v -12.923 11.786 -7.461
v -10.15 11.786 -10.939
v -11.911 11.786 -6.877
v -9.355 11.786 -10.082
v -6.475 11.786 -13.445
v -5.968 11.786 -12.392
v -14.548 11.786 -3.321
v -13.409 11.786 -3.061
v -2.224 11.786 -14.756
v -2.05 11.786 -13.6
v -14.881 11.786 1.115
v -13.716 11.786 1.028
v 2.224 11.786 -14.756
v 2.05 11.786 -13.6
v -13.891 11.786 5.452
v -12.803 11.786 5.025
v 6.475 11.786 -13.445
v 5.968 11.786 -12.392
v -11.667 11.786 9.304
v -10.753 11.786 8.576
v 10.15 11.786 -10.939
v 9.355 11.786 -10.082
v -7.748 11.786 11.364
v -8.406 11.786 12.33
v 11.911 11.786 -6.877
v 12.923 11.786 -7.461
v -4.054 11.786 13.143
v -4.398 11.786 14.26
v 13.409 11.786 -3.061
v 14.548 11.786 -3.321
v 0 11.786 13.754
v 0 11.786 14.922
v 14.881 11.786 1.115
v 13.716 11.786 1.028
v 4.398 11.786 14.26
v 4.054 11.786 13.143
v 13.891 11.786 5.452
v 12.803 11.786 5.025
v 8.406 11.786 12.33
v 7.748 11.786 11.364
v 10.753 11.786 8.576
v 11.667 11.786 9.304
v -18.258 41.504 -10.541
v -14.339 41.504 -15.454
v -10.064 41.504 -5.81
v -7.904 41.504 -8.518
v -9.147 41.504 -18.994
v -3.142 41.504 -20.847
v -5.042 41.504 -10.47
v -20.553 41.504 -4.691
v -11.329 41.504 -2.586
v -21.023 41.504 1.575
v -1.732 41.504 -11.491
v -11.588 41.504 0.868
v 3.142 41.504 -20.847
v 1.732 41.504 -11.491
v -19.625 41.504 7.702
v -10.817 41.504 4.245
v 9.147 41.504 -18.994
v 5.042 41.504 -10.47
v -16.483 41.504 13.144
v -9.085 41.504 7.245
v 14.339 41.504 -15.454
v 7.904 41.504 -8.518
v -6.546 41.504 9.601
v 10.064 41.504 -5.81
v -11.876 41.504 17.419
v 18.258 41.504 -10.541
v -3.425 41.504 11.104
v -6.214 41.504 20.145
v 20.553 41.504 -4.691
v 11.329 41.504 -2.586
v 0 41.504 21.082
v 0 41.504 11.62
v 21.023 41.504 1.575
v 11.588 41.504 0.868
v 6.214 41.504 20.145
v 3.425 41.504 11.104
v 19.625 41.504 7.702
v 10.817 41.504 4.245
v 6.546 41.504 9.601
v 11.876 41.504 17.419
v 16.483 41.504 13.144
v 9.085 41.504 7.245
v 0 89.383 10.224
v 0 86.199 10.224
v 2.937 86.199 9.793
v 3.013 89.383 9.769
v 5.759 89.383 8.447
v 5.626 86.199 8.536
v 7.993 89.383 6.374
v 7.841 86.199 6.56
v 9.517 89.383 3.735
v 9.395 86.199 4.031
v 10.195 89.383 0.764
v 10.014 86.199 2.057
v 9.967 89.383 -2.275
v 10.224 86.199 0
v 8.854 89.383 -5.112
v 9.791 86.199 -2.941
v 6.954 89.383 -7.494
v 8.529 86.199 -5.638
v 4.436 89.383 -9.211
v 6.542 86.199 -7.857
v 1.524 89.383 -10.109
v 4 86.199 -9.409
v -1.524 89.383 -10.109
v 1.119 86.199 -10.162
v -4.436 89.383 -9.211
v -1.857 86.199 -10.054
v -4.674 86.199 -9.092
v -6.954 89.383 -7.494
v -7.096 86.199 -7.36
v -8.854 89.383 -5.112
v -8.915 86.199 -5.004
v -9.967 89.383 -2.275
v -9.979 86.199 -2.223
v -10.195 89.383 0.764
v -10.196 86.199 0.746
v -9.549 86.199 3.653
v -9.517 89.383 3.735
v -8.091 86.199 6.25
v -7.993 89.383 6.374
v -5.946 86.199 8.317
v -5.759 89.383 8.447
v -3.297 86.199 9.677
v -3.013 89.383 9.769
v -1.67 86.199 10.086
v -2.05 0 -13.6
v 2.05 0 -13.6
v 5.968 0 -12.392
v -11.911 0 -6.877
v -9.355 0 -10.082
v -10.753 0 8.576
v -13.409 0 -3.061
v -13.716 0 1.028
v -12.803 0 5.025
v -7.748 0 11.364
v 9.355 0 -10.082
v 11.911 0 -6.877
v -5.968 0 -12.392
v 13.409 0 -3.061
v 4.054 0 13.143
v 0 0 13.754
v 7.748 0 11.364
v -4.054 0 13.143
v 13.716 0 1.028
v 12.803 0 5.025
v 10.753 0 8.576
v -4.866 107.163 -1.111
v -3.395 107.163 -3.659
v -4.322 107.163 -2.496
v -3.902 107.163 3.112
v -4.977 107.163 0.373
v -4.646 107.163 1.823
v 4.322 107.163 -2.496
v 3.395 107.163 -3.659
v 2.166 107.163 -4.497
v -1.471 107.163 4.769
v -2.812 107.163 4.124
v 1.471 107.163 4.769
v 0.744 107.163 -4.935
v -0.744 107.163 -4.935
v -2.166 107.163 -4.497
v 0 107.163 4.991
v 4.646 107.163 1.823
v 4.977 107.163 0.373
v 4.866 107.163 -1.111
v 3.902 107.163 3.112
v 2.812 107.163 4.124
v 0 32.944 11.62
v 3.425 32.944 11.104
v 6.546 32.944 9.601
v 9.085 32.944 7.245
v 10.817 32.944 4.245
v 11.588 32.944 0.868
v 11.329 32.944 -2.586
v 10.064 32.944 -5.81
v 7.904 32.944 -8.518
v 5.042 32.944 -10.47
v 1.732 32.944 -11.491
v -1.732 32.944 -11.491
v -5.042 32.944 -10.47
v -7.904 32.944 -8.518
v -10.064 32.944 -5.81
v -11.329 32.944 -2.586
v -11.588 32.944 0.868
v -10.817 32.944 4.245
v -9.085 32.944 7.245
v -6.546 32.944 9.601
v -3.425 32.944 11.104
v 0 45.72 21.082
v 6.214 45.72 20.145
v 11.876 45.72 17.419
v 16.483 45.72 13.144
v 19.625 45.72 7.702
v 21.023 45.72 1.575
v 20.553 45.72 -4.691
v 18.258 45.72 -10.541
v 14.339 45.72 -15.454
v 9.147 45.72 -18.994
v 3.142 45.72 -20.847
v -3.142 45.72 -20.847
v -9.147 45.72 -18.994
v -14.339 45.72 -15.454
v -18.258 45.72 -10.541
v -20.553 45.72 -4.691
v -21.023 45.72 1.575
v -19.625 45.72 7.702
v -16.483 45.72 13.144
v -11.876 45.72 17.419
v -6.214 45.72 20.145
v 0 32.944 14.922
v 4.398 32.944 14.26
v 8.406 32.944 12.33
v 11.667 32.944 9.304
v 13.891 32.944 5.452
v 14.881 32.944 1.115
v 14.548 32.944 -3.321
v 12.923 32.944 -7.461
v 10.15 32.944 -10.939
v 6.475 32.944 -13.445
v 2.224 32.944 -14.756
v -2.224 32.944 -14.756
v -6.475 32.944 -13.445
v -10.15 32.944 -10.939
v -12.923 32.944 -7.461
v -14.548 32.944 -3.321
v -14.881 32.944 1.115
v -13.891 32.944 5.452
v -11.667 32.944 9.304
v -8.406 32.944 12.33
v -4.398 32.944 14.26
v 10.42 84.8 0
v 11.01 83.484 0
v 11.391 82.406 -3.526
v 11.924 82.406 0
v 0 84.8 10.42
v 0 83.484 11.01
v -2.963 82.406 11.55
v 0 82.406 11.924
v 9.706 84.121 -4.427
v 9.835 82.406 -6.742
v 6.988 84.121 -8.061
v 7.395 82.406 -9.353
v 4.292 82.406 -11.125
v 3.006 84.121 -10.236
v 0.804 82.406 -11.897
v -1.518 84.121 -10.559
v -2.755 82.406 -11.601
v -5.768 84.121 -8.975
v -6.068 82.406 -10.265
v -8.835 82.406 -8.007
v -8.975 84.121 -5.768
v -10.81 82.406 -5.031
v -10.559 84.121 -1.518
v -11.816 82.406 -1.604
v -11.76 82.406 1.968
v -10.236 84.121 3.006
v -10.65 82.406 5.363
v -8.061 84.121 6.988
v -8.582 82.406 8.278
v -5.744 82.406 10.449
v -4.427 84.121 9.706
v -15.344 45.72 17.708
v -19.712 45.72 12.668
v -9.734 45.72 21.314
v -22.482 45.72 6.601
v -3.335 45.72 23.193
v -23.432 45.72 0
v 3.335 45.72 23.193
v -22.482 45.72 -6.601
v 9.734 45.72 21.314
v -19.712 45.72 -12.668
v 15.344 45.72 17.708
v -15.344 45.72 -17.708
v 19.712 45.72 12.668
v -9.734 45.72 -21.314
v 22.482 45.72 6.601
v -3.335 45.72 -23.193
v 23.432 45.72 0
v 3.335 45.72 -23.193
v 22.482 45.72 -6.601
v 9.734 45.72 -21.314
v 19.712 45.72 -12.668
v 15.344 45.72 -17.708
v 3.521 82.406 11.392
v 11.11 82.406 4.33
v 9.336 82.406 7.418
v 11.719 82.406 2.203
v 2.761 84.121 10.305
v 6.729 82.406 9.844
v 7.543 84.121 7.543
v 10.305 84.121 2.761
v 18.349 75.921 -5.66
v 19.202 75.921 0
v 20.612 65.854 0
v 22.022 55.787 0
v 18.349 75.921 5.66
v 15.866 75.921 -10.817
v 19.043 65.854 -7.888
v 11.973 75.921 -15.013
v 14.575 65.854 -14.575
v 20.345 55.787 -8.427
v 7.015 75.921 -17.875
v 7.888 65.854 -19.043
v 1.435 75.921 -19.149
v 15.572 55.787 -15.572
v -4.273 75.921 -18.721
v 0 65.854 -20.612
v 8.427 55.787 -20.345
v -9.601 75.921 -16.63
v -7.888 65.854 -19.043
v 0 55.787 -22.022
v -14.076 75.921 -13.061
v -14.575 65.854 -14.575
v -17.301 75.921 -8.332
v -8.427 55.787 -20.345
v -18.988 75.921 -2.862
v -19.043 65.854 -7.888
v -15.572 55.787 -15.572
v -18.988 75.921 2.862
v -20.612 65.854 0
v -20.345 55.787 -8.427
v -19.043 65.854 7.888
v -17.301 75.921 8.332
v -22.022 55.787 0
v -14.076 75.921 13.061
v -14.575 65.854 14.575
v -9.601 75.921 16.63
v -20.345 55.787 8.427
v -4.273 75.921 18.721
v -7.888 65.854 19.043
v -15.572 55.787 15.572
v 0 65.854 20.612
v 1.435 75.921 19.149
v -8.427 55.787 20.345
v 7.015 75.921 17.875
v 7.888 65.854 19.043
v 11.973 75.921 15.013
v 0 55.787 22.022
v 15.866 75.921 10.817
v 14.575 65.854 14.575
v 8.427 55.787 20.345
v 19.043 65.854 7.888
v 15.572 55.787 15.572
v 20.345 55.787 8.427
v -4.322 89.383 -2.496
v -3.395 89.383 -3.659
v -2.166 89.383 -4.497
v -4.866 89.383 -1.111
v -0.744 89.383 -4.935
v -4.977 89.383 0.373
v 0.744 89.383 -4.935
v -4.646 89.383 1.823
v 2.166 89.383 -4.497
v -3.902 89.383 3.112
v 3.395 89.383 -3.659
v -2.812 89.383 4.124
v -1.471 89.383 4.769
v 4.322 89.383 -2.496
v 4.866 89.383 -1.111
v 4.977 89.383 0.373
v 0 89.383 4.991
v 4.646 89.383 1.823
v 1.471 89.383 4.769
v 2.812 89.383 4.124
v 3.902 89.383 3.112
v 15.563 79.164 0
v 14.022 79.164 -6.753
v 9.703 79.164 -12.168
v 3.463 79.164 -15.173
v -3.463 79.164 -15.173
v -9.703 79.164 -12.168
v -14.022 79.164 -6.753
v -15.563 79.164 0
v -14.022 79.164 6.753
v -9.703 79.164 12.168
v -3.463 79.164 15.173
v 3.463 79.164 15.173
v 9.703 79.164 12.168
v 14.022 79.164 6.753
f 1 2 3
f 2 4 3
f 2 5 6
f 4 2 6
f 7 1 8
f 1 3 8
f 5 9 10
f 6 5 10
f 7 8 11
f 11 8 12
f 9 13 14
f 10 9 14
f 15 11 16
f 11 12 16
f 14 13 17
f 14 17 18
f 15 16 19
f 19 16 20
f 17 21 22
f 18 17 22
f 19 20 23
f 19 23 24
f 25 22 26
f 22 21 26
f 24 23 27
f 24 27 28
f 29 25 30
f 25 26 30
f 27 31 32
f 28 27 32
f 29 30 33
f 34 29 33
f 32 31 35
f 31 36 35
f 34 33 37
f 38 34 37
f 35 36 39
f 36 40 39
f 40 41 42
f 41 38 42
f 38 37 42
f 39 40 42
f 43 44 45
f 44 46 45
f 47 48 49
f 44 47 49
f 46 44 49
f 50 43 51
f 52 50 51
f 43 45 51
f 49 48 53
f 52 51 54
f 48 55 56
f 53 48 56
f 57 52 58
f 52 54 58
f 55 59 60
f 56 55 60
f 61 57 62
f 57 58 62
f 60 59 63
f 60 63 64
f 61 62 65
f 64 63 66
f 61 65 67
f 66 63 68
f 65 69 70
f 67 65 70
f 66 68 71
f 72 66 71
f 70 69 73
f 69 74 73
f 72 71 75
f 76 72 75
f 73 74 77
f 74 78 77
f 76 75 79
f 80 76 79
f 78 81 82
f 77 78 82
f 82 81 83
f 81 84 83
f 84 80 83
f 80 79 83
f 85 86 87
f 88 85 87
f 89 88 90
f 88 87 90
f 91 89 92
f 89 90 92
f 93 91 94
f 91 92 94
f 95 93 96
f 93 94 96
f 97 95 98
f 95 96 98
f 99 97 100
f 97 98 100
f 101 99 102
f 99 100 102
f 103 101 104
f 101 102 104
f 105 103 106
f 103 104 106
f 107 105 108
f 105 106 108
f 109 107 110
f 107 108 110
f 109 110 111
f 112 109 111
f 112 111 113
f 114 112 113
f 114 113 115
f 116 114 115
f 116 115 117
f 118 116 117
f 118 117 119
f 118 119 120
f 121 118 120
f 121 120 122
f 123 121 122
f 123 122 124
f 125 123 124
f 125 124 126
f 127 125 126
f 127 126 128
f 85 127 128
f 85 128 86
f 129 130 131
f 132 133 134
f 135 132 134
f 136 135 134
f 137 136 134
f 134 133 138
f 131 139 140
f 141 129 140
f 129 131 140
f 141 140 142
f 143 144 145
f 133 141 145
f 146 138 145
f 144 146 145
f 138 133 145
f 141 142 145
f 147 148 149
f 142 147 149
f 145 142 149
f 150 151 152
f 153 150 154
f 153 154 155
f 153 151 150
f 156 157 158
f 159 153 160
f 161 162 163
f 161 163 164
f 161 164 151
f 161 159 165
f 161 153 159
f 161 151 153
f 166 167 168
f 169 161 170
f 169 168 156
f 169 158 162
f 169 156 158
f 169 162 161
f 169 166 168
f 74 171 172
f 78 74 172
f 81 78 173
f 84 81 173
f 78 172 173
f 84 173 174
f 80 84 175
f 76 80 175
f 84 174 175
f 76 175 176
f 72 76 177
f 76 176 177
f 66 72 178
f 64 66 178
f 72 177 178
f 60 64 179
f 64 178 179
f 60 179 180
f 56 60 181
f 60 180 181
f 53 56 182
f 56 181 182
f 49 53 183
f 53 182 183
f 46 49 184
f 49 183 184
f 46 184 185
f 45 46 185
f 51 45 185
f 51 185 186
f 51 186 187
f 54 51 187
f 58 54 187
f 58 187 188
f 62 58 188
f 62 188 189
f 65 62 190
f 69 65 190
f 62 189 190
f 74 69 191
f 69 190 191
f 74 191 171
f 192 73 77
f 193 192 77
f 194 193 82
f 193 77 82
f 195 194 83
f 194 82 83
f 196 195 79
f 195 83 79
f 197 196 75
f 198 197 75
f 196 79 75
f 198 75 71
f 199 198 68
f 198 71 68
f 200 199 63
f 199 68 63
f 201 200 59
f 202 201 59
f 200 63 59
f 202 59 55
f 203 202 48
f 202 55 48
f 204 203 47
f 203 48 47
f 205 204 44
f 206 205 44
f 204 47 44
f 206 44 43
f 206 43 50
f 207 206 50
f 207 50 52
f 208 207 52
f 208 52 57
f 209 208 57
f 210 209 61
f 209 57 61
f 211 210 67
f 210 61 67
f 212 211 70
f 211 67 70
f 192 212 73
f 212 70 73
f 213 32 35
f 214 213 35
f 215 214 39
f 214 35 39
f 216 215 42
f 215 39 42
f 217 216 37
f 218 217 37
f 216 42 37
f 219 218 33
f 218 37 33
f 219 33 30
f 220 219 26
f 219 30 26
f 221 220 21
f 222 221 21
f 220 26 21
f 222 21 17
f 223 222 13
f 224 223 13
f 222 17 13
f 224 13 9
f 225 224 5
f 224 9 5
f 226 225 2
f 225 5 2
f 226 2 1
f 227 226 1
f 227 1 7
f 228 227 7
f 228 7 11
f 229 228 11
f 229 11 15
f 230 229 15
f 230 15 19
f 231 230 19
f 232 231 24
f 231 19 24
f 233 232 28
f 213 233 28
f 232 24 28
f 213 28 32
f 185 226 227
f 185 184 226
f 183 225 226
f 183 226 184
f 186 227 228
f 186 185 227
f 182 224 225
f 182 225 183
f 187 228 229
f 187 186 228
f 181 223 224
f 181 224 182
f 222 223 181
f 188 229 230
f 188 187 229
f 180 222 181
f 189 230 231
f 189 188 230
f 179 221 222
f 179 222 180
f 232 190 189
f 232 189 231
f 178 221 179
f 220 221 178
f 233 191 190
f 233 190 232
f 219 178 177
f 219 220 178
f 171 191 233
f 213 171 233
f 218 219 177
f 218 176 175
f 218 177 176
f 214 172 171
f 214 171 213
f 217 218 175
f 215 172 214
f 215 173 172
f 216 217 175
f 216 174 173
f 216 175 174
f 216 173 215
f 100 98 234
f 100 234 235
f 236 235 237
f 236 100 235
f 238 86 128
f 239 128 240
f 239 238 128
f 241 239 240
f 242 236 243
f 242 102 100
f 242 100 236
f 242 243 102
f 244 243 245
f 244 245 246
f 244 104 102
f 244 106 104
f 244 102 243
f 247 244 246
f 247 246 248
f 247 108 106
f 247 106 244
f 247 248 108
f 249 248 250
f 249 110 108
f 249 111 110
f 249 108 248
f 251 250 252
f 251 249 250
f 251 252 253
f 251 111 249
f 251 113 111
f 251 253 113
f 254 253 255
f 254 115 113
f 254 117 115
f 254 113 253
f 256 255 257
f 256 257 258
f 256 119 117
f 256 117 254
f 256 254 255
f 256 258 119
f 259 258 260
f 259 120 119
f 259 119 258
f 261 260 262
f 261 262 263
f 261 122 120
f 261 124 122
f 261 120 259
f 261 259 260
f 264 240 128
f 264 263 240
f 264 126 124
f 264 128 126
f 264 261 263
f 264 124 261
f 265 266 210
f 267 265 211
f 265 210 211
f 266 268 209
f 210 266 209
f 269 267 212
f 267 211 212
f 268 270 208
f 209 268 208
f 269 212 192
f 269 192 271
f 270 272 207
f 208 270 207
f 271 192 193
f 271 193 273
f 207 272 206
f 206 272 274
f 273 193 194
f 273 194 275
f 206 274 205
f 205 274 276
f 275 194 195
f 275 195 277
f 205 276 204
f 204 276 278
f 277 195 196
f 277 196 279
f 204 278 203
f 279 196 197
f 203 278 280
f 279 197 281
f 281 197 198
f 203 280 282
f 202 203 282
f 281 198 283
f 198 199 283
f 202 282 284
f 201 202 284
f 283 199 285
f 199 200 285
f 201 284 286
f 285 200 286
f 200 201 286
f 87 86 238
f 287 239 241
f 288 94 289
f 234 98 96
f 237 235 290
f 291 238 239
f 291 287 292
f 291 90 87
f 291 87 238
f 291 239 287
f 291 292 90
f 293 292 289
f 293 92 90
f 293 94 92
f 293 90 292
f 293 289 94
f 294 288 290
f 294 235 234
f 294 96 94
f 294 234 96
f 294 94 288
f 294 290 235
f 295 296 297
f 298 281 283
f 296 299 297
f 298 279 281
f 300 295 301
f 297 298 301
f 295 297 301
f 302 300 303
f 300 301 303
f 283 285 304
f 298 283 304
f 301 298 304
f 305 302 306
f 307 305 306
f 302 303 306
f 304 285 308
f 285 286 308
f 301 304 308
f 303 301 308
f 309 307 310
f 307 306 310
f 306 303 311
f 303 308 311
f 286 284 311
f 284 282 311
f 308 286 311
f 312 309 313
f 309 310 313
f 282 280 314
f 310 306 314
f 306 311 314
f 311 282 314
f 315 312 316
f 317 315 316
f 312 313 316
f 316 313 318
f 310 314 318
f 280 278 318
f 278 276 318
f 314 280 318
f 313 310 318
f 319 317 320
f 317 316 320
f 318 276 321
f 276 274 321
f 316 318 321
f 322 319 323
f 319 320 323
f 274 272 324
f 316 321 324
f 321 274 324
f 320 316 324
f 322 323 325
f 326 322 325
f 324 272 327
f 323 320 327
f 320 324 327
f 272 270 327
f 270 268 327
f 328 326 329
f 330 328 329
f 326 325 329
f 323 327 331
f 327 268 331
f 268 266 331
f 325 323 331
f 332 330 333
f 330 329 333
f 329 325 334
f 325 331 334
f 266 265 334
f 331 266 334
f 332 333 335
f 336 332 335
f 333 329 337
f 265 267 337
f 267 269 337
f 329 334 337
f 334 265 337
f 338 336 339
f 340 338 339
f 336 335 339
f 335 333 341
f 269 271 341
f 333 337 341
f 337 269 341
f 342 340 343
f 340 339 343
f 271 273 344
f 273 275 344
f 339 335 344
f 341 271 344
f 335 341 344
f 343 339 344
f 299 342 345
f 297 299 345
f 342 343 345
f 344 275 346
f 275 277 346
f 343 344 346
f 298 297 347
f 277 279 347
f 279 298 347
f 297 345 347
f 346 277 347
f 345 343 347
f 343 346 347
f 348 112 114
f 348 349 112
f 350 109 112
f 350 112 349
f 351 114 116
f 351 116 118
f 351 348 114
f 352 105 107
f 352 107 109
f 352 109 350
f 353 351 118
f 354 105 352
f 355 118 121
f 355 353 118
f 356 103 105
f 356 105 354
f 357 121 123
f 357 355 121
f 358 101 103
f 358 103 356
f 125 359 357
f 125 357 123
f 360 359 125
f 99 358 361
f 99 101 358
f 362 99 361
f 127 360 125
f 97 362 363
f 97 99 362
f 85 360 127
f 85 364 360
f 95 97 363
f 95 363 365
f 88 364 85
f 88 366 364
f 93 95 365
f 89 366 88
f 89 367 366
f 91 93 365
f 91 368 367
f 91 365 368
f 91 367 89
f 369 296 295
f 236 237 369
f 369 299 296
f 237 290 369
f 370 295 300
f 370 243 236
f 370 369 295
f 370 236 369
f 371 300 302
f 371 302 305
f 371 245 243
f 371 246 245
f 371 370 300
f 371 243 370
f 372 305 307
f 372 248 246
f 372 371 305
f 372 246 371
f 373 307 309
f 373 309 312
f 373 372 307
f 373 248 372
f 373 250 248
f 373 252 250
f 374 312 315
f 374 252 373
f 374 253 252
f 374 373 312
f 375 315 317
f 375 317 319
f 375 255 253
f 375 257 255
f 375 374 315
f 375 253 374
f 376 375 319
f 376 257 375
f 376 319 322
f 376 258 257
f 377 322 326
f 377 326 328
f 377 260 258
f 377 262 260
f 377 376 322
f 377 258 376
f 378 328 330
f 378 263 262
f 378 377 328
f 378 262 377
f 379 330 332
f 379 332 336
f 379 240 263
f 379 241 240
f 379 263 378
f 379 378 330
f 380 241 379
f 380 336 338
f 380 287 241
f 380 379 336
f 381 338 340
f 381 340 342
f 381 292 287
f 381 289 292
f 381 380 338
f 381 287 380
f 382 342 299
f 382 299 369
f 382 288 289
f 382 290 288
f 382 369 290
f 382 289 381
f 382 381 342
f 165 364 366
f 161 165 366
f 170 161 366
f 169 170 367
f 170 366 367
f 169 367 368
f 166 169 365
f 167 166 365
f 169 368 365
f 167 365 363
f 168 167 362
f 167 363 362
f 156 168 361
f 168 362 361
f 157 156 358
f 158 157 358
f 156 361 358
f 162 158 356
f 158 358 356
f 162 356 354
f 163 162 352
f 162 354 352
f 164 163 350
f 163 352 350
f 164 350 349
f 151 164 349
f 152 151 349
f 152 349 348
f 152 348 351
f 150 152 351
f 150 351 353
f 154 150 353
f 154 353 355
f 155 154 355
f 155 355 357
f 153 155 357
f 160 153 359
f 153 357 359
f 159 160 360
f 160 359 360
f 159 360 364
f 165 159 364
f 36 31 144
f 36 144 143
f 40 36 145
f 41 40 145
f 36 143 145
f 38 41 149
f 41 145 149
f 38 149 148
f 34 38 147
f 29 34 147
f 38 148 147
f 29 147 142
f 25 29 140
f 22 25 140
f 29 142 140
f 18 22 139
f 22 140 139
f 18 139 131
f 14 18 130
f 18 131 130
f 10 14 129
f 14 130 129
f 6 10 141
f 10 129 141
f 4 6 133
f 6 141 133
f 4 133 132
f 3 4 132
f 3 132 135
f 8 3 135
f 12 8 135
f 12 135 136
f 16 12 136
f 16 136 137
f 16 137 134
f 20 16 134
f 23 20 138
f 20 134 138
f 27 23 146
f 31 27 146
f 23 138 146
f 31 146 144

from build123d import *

# Parameters (mm, degrees)
SKETCH1_R           = 13.7541
BOSS_EXTRUDE1_DEPTH = 11.7856
SKETCH2_R           = 14.9225
BOSS_EXTRUDE2_DEPTH = 21.1582
SKETCH3_R           = 11.6205
BOSS_EXTRUDE3_DEPTH = 8.5598
SKETCH4_R           = 21.082
BOSS_EXTRUDE4_DEPTH = 4.2164
SKETCH6_R           = 19.2024
SKETCH5_R           = 23.4315
SKETCH8_R           = 10.2235
SKETCH9_R           = 10.2235
BOSS_EXTRUDE5_DEPTH = 5.461
SKETCH11_R          = 4.9911
BOSS_EXTRUDE6_DEPTH = 17.78
FILLET1_R           = 5.08


with BuildPart() as part:
    # Sketch1 → Boss-Extrude1 (new body)
    with BuildSketch(Plane(origin=(0, 0, 0), x_dir=(1, 0, 0), z_dir=(0, 1, 0))):
        with Locations(Location((0, 0, 0), (0, 0, 270))):
            Circle(SKETCH1_R)
    extrude(amount=BOSS_EXTRUDE1_DEPTH)

    # Sketch2 → Boss-Extrude2 (add)
    with BuildSketch(Plane(origin=(0, 11.7856, 0), x_dir=(1, 0, 0), z_dir=(0, 1, 0))):
        with Locations(Location((0, 0, 0), (0, 0, 270))):
            Circle(SKETCH2_R)
    extrude(amount=BOSS_EXTRUDE2_DEPTH)

    # Sketch3 → Boss-Extrude3 (add)
    with BuildSketch(Plane(origin=(0, 32.9438, 0), x_dir=(1, 0, 0), z_dir=(0, 1, 0))):
        with Locations(Location((0, 0, 0), (0, 0, 270))):
            Circle(SKETCH3_R)
    extrude(amount=BOSS_EXTRUDE3_DEPTH)

    # Sketch4 → Boss-Extrude4 (add)
    with BuildSketch(Plane(origin=(0, 41.5036, 0), x_dir=(1, 0, 0), z_dir=(0, 1, 0))):
        with Locations(Location((0, 0, 0), (0, 0, 270))):
            Circle(SKETCH4_R)
    extrude(amount=BOSS_EXTRUDE4_DEPTH)

    # Sketch6 → Loft1 section 0
    with BuildSketch(Plane(origin=(0, 75.9206, 0), x_dir=(1, 0, 0), z_dir=(0, 1, 0))):
        Circle(SKETCH6_R)
    # Sketch5 → Loft1 section 1
    with BuildSketch(Plane(origin=(0, 45.72, 0), x_dir=(1, 0, 0), z_dir=(0, 1, 0))):
        Circle(SKETCH5_R)
    loft()

    # Sketch8 → section 1 of loft2
    with BuildSketch(Plane(origin=(0, 83.9216, 0), x_dir=(1, 0, 0), z_dir=(0, 1, 0)), mode=Mode.PRIVATE) as loft2_s1:
        Circle(SKETCH8_R)
    # loft up to a face of the part (loft2)
    loft([Face(Wire([part.edges().sort_by_distance((-13.144947347, 75.9206, -13.997947171))[0]])), loft2_s1.sketch])

    # Sketch9 → Boss-Extrude5 (add)
    with BuildSketch(Plane(origin=(0, 83.9216, 0), x_dir=(1, 0, 0), z_dir=(0, 1, 0))):
        with Locations(Location((0, 0, 0), (0, 0, 270))):
            Circle(SKETCH9_R)
    extrude(amount=BOSS_EXTRUDE5_DEPTH)

    # Sketch11 → Boss-Extrude6 (add)
    with BuildSketch(Plane(origin=(0, 89.3826, 0), x_dir=(1, 0, 0), z_dir=(0, 1, 0))):
        with Locations(Location((0, 0, 0), (0, 0, 270))):
            Circle(SKETCH11_R)
    extrude(amount=BOSS_EXTRUDE6_DEPTH)

    # Fillet1
    fillet1_edges = [part.edges().sort_by_distance(p)[0] for p in [
        (-7.229106177, 83.9216, -7.229106177),
    ]]
    fillet(fillet1_edges, radius=FILLET1_R)


solid = part.part
